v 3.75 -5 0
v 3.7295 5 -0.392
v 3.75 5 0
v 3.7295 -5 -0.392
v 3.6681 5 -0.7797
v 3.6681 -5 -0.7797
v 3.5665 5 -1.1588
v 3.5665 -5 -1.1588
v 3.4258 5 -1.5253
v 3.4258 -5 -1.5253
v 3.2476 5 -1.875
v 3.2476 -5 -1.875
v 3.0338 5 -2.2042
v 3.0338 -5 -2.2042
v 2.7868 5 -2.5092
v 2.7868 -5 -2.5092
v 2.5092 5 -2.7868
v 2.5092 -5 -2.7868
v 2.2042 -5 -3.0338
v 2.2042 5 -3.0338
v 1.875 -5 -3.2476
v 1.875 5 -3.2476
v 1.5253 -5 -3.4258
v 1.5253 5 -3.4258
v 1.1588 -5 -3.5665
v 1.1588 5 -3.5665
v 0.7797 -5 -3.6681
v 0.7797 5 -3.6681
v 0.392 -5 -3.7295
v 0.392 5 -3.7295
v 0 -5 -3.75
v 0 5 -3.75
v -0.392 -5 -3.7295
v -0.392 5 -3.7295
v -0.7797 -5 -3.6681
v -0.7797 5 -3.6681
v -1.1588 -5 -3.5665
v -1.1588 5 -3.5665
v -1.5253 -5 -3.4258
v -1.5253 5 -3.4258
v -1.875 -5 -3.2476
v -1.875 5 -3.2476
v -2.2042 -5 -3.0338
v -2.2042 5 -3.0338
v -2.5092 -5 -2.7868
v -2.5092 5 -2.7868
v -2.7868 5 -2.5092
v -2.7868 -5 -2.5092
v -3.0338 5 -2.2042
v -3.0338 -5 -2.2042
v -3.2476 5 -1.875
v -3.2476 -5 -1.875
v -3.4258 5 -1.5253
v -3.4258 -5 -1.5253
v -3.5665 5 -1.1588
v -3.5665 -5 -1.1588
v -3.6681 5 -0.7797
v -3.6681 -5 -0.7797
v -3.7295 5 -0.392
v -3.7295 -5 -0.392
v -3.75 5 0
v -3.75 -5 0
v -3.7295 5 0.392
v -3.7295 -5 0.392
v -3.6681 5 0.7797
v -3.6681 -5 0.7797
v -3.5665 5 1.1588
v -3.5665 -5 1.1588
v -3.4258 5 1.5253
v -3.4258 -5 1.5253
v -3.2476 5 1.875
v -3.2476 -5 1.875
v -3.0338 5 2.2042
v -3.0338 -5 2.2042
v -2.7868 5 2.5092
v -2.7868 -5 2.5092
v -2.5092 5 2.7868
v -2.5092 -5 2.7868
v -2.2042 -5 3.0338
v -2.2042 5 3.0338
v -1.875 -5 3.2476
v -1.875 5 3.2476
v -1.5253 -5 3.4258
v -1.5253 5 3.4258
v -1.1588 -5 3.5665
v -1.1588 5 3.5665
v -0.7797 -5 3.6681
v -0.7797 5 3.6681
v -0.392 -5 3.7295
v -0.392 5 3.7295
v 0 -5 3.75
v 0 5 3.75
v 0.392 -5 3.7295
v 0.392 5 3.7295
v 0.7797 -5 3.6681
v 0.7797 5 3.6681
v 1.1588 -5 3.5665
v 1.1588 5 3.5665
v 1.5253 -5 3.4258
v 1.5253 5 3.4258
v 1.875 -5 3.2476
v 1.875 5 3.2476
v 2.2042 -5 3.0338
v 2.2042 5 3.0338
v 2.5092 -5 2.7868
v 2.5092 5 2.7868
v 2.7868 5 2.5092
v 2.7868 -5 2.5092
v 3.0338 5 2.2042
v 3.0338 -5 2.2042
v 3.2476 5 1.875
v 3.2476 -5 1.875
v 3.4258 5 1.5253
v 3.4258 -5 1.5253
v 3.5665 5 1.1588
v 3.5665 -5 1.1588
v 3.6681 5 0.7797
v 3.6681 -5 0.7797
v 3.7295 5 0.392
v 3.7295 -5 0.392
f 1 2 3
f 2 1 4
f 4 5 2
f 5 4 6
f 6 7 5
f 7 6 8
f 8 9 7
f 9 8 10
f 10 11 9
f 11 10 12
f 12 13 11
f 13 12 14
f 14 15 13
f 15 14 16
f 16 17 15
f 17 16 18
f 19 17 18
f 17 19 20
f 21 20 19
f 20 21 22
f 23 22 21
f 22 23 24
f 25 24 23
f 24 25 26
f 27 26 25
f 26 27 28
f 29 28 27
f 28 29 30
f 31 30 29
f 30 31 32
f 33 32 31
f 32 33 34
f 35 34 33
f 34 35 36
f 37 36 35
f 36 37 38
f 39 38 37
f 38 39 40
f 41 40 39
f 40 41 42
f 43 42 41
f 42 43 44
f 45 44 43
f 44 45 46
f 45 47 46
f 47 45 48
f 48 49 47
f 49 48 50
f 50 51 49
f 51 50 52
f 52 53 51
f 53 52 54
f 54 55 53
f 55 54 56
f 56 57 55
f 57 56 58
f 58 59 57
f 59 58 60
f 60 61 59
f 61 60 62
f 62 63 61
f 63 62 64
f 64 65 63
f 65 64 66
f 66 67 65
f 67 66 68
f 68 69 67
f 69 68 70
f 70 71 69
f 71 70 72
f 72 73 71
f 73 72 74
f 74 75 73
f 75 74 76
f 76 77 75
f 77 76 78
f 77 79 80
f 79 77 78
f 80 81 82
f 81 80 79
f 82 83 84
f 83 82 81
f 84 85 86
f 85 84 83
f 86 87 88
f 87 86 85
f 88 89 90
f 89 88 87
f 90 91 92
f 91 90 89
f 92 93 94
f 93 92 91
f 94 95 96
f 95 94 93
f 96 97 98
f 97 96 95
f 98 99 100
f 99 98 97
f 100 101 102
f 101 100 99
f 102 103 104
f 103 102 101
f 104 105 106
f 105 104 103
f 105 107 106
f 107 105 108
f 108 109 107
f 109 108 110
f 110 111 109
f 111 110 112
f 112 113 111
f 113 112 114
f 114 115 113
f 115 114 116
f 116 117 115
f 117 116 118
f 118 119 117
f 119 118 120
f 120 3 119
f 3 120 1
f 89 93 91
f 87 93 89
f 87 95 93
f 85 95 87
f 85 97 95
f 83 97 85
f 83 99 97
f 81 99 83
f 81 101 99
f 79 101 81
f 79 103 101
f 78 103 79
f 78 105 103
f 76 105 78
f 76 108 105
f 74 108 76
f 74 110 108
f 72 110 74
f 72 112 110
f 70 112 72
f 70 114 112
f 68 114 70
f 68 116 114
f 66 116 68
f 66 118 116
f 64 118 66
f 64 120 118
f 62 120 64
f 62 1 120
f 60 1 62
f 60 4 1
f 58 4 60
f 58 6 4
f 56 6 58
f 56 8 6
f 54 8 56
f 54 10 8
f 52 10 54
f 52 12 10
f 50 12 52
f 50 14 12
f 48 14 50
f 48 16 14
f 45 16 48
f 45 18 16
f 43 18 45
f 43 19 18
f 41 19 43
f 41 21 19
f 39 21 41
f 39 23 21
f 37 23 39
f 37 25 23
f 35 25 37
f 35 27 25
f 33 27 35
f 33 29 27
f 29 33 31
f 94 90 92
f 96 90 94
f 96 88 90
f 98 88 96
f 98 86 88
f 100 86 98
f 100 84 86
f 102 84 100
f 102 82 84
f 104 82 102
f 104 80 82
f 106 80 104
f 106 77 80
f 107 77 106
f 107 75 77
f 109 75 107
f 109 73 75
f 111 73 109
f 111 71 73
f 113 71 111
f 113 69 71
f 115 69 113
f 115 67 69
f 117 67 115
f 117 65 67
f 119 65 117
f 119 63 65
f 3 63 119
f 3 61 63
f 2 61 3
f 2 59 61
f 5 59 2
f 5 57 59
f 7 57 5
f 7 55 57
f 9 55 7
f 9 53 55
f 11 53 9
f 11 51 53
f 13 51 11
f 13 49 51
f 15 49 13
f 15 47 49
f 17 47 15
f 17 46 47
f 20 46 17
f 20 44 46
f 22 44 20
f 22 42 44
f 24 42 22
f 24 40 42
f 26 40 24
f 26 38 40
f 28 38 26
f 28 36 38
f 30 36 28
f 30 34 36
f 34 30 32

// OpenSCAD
translate([-0.000000, -4.375009, -0.000000])
multmatrix(m = [[1, -0, 0, 0.000000], [0, 0, 1, -0.625001], [0, -1, 0, 0.000000], [0, 0, 0, 1]])
cylinder(h = 10.000010, r1 = 3.750004, r2 = 3.750004, center = false, $fn = 60);
